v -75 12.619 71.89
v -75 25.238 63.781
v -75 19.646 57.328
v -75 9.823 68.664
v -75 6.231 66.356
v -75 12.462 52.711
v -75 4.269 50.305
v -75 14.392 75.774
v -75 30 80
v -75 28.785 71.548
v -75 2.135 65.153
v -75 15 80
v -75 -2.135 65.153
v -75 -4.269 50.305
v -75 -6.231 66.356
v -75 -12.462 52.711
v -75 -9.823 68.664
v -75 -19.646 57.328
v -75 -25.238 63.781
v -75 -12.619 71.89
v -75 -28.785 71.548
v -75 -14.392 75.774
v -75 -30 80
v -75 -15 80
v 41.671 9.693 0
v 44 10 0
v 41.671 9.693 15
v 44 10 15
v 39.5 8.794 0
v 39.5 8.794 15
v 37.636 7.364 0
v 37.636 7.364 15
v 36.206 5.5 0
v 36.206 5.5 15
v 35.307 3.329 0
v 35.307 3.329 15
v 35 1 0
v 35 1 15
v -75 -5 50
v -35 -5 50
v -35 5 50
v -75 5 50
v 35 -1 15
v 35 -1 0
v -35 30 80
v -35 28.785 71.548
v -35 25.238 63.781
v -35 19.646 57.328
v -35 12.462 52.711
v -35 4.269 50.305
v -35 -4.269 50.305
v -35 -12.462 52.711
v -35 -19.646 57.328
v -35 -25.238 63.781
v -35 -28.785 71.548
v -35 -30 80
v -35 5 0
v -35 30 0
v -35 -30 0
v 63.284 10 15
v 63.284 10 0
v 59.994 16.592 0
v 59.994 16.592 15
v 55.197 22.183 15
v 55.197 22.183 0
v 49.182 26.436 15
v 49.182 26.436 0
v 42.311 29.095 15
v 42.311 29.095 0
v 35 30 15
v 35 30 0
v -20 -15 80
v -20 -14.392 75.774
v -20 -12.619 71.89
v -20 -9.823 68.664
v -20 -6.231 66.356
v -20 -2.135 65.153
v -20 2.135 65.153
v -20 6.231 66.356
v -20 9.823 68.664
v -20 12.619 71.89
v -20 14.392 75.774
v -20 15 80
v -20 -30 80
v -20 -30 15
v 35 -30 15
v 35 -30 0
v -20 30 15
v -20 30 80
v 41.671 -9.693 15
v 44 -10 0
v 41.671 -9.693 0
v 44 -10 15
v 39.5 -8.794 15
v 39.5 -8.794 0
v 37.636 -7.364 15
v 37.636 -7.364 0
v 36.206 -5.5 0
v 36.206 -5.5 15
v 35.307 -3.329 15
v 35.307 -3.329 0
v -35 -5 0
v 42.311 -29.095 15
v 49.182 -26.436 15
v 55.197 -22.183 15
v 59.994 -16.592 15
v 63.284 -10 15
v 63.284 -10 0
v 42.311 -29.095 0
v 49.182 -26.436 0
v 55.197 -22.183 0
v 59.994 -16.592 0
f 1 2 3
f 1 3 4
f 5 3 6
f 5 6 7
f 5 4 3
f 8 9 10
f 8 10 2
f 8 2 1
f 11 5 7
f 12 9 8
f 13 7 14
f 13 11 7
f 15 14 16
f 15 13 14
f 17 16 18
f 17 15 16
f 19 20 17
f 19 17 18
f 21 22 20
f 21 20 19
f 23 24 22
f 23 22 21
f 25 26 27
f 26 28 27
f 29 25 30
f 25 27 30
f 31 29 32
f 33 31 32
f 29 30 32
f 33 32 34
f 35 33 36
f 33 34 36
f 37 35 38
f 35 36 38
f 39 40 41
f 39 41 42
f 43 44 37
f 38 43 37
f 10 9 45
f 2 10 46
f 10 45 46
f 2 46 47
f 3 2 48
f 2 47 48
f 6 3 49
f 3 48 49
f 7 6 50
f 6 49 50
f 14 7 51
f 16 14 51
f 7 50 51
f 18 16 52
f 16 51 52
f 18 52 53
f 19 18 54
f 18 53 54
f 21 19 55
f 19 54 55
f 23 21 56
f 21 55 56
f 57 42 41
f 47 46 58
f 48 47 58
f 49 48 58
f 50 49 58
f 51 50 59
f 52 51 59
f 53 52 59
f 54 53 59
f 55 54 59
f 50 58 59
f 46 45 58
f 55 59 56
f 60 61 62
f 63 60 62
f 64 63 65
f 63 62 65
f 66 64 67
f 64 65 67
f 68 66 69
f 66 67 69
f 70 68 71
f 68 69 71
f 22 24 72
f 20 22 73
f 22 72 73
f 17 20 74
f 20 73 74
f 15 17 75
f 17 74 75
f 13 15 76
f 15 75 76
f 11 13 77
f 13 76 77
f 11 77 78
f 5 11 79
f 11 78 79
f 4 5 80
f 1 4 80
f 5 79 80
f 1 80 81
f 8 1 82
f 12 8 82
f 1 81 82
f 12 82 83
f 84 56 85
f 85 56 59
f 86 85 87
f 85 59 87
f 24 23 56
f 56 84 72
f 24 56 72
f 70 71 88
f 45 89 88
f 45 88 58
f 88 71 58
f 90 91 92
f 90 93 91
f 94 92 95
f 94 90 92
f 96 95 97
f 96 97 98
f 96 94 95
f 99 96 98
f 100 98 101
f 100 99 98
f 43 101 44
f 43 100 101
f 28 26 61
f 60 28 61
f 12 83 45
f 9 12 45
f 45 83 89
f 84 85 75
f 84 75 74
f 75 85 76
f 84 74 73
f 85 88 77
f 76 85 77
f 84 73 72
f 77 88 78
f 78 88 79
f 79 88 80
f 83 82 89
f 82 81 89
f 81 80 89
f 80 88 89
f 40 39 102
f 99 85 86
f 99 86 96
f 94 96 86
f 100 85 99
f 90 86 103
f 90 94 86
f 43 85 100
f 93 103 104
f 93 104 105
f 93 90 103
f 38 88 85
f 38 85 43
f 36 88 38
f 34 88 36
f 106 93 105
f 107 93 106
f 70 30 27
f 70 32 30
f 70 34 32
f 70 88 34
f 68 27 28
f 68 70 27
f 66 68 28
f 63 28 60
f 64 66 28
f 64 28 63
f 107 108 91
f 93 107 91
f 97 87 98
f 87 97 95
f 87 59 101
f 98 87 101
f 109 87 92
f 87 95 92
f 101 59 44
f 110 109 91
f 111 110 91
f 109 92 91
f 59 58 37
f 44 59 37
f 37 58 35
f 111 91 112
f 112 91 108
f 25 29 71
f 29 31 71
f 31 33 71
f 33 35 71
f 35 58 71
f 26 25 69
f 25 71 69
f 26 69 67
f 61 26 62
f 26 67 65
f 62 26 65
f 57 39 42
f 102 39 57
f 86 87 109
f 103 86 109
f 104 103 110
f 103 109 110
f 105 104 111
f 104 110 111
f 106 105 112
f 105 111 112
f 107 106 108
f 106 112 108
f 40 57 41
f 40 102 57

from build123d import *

# Parameters (mm, degrees)
F1_DEPTH      = 15
F2_W          = 15
F2_H          = 65
F3_DEPTH      = 30
F3_DEPTH_BACK = 30
F5_DEPTH      = 40
F6_DEPTH      = 25
F8_DEPTH      = 5
F8_DEPTH_BACK = 5
F9_R          = 9


with BuildPart() as f1:
    # F0 (on Top) → F1 (new body)
    with BuildSketch(Plane.XY):
        Polygon((35, 10), (35, 30), (-35, 30), (-35, -30), (35, -30), (35, -10), align=None)
        with BuildLine():
            ThreePointArc((63.2842712475, 10), (52.3205080757, 24.4948974278), (35, 30))
            Line((35, 30), (35, 10))
            Line((35, 10), (63.2842712475, 10))
        make_face()
        with BuildLine():
            Line((63.2842712475, -10), (35, -10))
            Line((35, -10), (35, -30))
            ThreePointArc((35, -30), (52.3205080757, -24.4948974278), (63.2842712475, -10))
        make_face()
    extrude(amount=F1_DEPTH)

    # F2 (on Front) → F3 (join, two sides)
    with BuildSketch(Plane.XZ) as f3_sk:
        Polygon((-35, 15), (-35, 0), (35, 0), (35, 15), (-20, 15), align=None)
        with Locations((-27.5, 47.5)):
            Rectangle(F2_W, F2_H)
    extrude(amount=F3_DEPTH)
    extrude(f3_sk.sketch, amount=-F3_DEPTH_BACK)

    # F4 (on face) → F5 (join)
    with BuildSketch(Plane(origin=(-35, 0, 0), x_dir=(0, -1, 0), z_dir=(-1, 0, 0))):
        with BuildLine():
            ThreePointArc((15, 80), (0, 65), (-15, 80))
            Line((-15, 80), (-30, 80))
            ThreePointArc((-30, 80), (0, 50), (30, 80))
            Line((30, 80), (15, 80))
        make_face()
    extrude(amount=F5_DEPTH)

    # F6 (cut): a face of the model
    f6_faces = [f1.faces().sort_by_distance(p)[0] for p in [
        (-35, 0, 73.6338022763),
    ]]
    extrude(f6_faces, amount=-F6_DEPTH, mode=Mode.SUBTRACT)

    # F9
    f9_edges = [f1.edges().sort_by_distance(p)[0] for p in [
        (35, 10, 7.5),
        (35, -10, 7.5),
    ]]
    fillet(f9_edges, radius=F9_R)


with BuildPart() as f8:
    # F7 (on Front) → F8 (new body, two sides)
    with BuildSketch(Plane.XZ) as f8_sk:
        Polygon((-35, 0), (-35, 50), (-75, 50), align=None)
    extrude(amount=F8_DEPTH)
    extrude(f8_sk.sketch, amount=-F8_DEPTH_BACK)


solid = Compound([f1.part, f8.part])
